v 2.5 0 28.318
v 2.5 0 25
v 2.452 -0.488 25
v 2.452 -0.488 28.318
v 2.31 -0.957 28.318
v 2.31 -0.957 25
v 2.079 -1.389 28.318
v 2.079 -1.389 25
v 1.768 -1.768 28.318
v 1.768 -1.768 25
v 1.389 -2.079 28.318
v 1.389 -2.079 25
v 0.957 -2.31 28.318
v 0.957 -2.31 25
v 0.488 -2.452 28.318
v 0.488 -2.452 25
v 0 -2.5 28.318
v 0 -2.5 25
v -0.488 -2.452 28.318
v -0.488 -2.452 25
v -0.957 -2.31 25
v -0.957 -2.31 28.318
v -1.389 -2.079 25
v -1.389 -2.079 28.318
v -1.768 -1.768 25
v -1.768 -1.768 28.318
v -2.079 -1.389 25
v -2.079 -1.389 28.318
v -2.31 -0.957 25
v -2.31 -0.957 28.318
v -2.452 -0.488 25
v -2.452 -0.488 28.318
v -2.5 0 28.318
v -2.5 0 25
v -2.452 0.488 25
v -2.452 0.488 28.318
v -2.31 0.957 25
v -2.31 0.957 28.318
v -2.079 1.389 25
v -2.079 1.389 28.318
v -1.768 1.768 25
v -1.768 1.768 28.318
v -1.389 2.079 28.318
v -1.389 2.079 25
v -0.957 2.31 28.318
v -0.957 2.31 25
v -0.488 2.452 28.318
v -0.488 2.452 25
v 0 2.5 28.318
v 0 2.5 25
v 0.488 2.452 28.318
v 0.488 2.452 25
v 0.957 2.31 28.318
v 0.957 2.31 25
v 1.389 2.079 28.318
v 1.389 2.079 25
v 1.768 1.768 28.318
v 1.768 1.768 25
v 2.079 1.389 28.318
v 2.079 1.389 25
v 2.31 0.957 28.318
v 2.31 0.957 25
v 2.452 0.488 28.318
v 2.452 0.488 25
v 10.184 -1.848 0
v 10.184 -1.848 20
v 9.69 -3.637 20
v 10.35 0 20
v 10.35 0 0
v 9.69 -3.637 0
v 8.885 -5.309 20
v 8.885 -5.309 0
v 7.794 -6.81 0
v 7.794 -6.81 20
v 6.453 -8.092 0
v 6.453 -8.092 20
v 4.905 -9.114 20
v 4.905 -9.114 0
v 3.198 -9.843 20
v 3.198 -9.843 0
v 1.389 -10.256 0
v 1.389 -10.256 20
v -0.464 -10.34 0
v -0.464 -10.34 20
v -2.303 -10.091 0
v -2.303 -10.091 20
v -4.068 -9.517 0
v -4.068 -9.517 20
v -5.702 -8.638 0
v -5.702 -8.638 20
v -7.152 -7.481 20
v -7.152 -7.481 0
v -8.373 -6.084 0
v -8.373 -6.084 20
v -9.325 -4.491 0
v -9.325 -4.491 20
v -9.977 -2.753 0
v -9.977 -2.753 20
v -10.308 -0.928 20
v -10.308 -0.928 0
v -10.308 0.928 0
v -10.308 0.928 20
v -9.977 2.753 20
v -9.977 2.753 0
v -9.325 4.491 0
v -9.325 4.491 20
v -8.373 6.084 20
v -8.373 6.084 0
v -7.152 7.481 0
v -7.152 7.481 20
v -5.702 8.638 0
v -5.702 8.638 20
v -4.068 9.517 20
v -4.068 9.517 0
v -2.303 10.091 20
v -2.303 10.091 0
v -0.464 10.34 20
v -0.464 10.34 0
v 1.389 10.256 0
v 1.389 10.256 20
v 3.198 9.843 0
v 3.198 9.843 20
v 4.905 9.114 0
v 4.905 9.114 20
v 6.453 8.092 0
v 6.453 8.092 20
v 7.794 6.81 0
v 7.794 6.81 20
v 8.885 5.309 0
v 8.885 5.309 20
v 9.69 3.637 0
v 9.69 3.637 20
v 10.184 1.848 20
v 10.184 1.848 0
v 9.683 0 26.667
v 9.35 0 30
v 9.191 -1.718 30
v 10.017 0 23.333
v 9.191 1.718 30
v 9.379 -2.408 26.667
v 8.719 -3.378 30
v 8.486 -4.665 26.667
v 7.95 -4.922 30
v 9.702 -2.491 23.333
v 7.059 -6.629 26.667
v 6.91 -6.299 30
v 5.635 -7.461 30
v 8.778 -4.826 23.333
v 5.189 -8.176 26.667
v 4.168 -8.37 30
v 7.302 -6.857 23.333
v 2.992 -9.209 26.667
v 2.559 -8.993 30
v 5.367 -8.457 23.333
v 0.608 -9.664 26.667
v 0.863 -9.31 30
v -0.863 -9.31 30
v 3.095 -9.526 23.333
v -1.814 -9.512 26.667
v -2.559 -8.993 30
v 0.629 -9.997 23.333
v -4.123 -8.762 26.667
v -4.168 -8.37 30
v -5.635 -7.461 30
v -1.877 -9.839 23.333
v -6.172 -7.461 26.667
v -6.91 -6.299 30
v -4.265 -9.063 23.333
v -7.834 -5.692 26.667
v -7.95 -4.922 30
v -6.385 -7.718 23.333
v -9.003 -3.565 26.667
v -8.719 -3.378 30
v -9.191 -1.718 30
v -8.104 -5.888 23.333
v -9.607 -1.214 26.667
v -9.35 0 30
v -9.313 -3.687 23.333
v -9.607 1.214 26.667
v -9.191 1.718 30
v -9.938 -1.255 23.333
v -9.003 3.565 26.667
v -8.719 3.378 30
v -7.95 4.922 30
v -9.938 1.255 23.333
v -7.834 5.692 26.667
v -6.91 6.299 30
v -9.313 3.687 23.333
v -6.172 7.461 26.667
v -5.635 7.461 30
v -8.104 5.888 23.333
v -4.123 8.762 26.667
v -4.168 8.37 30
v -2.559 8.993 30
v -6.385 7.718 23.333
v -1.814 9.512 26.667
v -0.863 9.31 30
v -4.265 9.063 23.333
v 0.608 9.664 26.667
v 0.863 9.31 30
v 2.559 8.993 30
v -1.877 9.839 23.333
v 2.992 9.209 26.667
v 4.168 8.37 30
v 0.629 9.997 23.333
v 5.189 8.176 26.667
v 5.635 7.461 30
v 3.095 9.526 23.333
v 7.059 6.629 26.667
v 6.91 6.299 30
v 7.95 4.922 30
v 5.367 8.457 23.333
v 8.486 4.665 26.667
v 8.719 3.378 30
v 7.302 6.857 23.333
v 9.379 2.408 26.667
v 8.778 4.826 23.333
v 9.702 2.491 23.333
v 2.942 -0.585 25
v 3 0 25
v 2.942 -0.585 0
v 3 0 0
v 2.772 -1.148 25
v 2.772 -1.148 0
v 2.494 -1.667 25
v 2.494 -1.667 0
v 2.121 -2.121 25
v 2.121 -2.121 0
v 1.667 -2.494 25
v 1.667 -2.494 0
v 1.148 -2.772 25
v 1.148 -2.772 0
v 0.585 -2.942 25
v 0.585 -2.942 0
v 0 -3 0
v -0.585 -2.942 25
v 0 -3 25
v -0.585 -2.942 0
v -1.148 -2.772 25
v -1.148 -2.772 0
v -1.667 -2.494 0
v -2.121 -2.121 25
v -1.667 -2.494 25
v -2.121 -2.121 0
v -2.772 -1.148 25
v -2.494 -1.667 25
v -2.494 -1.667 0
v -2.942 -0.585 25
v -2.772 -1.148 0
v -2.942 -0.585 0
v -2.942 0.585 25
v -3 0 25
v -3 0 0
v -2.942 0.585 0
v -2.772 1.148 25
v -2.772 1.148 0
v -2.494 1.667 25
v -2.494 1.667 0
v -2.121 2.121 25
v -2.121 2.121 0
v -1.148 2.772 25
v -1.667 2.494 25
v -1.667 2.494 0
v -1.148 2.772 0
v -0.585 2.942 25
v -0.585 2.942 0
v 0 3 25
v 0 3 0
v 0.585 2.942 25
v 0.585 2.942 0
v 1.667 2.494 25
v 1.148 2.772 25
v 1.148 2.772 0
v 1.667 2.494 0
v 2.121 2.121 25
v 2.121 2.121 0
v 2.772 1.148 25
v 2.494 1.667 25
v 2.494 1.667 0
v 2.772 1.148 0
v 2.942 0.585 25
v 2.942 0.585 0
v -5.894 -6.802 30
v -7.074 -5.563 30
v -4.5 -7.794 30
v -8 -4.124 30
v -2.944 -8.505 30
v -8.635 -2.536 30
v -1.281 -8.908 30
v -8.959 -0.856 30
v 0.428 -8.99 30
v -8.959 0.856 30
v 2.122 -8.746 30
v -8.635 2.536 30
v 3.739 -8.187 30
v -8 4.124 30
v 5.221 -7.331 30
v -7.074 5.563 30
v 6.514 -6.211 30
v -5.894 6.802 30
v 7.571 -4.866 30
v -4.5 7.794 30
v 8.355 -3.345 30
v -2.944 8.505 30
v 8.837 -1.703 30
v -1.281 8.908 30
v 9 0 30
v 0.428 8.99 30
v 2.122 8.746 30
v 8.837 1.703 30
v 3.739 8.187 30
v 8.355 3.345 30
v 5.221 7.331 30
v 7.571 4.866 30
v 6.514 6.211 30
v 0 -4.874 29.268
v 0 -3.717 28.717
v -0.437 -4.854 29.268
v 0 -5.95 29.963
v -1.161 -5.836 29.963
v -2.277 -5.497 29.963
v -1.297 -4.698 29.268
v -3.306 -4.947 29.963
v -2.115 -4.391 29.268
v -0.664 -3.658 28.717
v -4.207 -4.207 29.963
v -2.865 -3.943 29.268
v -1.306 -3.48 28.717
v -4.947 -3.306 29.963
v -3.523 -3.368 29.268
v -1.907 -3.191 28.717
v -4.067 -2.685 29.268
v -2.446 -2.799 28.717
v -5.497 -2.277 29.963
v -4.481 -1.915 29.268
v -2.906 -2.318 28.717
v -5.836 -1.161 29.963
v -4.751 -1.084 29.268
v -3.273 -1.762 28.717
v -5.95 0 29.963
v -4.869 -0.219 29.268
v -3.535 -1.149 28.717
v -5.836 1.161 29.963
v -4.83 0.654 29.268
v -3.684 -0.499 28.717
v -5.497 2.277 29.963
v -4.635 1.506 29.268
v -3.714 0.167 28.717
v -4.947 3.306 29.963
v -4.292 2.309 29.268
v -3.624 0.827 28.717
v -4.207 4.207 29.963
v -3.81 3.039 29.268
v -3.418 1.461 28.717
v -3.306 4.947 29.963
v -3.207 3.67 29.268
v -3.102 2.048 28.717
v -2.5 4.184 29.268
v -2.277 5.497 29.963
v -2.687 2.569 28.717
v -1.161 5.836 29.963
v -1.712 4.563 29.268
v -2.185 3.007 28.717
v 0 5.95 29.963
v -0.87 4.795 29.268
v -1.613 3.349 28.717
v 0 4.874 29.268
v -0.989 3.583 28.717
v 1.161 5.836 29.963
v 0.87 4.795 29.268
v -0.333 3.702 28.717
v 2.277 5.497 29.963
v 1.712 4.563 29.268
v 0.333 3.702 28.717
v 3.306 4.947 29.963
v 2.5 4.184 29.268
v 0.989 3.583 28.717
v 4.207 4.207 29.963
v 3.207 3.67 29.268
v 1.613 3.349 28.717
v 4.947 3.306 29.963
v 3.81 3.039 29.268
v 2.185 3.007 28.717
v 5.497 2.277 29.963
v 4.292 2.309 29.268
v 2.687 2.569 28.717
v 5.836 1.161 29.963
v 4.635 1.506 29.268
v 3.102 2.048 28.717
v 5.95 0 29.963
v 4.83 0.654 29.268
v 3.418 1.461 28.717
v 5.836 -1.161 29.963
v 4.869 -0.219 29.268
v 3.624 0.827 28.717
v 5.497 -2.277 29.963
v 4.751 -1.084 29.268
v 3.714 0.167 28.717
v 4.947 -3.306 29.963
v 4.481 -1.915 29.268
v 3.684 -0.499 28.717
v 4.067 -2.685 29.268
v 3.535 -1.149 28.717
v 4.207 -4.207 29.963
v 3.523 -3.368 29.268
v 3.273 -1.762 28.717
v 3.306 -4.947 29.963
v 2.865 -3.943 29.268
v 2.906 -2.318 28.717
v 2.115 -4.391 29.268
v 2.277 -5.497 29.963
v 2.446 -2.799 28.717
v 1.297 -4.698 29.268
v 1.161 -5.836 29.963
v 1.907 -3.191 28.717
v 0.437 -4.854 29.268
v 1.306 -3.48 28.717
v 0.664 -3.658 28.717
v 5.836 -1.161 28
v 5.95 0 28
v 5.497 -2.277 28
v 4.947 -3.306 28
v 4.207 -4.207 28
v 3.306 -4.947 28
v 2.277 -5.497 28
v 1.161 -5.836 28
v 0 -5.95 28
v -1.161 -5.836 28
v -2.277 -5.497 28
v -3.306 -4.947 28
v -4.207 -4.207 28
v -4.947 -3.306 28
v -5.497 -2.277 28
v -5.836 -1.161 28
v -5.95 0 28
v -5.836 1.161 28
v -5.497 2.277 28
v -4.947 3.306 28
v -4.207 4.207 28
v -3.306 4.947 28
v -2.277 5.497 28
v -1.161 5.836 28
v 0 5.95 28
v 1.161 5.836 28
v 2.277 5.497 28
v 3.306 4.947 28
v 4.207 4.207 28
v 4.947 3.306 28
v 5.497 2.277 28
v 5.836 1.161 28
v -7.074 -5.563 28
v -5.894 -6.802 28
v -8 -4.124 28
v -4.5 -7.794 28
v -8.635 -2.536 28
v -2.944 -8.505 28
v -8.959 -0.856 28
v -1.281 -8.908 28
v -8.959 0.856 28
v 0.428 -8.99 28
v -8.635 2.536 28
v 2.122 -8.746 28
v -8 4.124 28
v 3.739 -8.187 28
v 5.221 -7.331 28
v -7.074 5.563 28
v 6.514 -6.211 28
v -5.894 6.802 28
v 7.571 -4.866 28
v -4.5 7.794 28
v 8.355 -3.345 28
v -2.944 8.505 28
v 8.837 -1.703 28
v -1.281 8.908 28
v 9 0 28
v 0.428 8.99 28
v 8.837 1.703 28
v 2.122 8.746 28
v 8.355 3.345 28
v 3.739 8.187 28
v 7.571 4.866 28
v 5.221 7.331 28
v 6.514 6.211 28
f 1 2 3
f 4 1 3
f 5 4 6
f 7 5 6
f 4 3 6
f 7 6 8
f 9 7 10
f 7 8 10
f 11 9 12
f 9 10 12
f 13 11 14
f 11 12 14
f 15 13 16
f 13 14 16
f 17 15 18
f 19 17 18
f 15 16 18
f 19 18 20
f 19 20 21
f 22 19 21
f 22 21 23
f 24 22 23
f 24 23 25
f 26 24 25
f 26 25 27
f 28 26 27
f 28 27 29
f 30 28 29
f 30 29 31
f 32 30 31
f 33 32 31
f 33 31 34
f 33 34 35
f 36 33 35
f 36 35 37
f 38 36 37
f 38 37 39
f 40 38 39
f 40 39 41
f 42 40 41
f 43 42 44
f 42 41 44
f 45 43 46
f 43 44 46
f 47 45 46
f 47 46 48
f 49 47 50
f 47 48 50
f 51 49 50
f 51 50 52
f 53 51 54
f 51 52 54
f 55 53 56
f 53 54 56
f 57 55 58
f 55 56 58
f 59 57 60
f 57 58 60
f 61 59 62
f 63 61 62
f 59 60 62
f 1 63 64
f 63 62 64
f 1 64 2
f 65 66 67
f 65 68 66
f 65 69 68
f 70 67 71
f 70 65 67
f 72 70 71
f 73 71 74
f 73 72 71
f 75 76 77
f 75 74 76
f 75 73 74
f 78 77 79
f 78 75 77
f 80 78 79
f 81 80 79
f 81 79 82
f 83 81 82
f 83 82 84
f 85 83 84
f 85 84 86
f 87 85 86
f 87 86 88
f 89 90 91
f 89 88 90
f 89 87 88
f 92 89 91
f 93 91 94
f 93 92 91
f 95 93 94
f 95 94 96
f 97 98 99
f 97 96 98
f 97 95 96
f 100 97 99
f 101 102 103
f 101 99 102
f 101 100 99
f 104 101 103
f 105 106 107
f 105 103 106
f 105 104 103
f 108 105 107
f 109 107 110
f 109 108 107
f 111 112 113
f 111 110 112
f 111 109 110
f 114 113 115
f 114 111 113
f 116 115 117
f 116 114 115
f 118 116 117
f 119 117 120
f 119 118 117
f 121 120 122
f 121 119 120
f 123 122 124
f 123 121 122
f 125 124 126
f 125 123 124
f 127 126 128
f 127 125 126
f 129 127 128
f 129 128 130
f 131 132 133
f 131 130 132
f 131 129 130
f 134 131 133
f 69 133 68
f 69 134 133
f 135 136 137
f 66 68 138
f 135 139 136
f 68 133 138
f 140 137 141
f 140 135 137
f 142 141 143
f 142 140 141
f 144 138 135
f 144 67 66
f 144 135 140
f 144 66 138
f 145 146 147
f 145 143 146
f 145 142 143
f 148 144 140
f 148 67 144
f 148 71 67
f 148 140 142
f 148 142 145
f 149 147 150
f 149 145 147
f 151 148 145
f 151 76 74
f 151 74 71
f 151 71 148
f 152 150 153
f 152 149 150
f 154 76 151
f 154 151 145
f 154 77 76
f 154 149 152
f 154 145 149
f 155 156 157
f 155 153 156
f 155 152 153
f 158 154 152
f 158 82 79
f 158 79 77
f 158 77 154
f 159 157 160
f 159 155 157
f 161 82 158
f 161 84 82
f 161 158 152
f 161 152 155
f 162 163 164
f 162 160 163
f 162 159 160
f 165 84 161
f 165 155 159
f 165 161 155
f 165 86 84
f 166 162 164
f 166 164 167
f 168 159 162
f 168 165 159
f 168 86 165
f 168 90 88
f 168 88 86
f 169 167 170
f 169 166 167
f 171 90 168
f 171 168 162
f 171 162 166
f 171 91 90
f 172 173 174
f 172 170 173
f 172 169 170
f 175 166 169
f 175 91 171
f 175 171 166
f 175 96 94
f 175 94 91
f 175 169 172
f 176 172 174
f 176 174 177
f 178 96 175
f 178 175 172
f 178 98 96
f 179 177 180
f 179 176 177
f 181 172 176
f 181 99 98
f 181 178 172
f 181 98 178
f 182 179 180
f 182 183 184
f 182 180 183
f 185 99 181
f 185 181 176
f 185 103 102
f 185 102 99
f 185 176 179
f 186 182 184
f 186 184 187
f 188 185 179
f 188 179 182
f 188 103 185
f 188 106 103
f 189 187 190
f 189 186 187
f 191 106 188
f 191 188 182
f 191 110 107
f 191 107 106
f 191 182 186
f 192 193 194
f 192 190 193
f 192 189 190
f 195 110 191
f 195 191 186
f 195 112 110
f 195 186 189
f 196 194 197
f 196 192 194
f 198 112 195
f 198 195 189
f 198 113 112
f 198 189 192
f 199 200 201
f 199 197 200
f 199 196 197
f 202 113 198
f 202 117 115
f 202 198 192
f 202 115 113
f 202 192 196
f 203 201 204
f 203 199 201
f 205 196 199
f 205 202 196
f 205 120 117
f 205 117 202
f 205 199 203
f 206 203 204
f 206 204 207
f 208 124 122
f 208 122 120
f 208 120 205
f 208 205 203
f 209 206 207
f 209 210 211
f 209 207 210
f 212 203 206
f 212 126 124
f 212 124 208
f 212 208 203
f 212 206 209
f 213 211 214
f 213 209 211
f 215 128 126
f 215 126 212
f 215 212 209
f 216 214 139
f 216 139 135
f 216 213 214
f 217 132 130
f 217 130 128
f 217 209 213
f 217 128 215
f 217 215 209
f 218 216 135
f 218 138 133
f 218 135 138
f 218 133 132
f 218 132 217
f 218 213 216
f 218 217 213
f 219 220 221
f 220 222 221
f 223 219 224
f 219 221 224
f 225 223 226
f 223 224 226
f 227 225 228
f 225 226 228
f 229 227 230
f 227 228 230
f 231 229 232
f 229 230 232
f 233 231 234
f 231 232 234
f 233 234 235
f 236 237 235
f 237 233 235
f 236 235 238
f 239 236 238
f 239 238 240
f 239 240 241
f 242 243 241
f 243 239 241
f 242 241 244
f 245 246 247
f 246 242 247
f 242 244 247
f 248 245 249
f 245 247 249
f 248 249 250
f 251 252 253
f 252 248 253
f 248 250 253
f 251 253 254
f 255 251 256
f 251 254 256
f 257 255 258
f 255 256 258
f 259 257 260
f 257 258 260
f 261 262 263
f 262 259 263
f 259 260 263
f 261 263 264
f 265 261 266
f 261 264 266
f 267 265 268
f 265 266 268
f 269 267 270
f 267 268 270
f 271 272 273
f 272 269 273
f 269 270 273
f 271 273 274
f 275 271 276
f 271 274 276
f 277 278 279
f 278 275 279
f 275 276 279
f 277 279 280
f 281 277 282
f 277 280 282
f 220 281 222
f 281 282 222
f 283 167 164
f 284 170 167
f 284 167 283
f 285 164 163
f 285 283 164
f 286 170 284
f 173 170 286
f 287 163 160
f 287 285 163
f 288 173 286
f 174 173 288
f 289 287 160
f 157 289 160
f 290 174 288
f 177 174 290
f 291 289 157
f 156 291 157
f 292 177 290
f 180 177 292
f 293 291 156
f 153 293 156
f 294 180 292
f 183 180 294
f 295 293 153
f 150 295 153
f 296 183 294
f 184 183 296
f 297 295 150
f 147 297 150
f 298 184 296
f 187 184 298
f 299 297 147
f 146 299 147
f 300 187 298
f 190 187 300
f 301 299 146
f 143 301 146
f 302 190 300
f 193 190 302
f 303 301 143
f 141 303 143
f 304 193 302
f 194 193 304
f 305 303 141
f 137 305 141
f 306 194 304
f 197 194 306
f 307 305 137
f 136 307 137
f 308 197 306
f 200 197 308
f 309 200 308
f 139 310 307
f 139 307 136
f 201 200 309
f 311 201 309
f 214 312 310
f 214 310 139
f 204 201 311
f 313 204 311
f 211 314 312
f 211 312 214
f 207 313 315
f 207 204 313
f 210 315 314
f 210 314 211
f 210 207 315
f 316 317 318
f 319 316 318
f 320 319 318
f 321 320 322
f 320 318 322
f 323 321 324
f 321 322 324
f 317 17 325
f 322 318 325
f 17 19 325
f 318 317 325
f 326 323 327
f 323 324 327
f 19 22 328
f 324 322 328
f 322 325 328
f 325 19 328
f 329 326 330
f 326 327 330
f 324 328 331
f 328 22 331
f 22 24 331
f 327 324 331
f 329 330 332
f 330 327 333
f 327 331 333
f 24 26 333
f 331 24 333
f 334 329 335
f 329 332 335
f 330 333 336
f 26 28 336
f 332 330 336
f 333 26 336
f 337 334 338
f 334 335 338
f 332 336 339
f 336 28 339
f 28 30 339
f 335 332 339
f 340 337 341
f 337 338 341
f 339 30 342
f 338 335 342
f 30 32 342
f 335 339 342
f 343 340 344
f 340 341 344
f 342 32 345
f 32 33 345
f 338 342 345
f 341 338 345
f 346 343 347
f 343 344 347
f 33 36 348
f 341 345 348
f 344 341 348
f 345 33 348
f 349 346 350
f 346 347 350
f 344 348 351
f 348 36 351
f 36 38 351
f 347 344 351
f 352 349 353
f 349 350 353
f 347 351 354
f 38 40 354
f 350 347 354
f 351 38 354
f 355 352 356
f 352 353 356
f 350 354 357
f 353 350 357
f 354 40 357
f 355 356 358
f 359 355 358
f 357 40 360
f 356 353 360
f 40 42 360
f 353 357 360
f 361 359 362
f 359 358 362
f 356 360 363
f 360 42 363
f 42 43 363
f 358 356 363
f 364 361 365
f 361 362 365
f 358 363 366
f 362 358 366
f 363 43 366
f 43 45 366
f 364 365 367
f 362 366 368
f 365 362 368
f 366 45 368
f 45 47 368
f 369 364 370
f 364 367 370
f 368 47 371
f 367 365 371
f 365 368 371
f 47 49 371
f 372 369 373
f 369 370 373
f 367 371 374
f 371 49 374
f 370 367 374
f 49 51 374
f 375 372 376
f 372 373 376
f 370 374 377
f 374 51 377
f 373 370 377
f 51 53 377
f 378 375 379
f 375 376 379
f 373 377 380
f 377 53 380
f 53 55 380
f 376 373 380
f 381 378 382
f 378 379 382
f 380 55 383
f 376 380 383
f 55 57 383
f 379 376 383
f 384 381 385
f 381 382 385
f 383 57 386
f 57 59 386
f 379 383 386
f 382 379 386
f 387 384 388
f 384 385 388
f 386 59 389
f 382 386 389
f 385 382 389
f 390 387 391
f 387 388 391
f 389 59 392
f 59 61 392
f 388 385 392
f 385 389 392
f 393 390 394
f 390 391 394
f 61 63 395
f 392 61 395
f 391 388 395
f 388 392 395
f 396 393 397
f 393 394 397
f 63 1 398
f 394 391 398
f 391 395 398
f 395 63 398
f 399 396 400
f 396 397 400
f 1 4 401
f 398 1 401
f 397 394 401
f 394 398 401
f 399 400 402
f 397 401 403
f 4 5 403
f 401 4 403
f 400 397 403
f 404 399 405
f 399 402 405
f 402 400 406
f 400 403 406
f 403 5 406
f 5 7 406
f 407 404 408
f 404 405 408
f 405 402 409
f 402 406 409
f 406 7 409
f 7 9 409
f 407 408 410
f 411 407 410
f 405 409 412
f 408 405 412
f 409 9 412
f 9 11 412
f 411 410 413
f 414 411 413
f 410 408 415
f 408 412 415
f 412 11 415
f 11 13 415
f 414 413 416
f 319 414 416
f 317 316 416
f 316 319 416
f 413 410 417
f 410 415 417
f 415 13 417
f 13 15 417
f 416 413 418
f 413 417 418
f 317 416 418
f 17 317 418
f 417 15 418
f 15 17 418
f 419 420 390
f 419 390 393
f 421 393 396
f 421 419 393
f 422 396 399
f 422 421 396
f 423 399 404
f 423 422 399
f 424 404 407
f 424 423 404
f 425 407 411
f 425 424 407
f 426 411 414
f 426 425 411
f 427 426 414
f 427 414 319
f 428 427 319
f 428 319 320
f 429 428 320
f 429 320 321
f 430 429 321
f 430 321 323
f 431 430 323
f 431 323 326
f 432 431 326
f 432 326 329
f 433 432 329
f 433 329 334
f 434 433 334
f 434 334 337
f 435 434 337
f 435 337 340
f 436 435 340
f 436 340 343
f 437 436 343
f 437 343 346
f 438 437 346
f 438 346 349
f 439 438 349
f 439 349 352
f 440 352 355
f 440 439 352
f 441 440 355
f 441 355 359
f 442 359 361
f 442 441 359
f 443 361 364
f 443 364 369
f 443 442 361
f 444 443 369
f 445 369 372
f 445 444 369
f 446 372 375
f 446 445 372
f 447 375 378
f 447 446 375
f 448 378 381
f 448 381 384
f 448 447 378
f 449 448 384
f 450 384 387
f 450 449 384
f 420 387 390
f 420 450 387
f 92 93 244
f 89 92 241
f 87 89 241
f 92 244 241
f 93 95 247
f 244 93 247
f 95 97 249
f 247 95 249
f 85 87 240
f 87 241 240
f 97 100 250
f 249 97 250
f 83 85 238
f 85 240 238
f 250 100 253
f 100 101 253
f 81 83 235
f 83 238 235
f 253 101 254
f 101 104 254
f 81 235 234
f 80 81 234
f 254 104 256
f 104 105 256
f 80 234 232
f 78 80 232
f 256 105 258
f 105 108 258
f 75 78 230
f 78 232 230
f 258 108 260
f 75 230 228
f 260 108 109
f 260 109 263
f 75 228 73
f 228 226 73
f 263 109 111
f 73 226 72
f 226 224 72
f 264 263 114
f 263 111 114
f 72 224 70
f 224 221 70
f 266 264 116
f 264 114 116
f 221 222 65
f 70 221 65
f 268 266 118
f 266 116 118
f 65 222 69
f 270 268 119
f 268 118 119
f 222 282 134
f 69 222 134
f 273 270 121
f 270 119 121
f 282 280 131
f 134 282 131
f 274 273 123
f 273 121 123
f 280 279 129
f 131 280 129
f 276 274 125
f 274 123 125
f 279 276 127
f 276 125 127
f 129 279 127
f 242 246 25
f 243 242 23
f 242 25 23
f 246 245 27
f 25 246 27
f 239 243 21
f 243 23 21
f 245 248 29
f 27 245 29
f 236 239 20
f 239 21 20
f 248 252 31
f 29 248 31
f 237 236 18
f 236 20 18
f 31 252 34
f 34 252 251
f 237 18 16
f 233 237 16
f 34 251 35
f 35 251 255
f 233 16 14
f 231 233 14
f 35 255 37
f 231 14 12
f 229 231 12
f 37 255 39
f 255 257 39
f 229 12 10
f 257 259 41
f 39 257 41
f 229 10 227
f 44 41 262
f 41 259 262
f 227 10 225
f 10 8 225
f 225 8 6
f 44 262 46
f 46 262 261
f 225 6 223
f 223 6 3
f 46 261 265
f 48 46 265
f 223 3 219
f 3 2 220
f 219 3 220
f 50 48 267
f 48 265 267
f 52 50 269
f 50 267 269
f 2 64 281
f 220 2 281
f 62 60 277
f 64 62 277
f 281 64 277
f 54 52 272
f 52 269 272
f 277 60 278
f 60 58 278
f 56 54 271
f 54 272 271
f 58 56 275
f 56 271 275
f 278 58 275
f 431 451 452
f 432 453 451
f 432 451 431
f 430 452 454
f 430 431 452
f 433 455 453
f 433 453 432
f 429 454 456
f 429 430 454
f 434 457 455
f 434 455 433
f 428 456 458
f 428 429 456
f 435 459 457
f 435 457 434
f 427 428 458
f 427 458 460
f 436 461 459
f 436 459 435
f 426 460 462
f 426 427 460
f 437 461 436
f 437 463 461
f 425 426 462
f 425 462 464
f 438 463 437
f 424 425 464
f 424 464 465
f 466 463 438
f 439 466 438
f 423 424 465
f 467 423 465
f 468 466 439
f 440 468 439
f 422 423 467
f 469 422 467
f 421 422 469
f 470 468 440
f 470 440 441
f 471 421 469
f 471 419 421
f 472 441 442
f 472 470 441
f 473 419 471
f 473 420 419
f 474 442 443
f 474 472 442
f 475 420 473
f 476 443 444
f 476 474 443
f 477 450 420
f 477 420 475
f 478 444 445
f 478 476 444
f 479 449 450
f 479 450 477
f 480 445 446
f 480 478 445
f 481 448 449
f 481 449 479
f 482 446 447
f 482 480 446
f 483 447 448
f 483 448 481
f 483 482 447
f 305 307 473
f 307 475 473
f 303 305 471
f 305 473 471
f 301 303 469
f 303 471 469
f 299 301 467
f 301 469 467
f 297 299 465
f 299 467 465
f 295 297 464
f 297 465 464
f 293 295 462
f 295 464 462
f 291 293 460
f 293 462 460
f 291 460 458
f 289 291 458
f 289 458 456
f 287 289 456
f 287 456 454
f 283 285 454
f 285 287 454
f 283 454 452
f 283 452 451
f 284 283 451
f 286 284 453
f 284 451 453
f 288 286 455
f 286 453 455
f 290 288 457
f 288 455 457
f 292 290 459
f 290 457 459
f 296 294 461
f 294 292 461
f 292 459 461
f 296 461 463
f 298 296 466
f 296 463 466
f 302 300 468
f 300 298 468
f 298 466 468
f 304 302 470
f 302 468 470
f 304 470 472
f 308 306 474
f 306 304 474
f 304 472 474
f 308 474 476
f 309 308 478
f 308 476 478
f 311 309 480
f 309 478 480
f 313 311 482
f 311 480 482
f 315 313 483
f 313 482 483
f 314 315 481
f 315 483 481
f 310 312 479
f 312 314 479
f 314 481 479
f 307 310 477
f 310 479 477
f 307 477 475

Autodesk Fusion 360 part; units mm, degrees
sketch "Sketch1" plane through (0, 0, 0) normal (0, 0, 1) x (1, 0, 0)
  circle A0 centre (0, 0) radius 5.95
  circle A1 centre (0, 0) radius 9
  circle A2 centre (0, 0) radius 10.35
  circle A3 centre (0, 0) radius 2.5
  circle A4 centre (0, 0) radius 3
  dimension "d1" = 11.9
  dimension "d2" = 18
  dimension "d3" = 20.7
  dimension "d8" = 5
  dimension "d9" = 6
extrude "Extrude1" add sketch "Sketch1" along normal blind 30 contours A0 | A2 | A4 makes body 1 at (10.2986, -1.0305, 20) makes body 2 at (5.9204, -0.5924, 20)
extrude "Extrude2" add sketch "Sketch1" along normal blind 28 contours A1 bodies 1 2
extrude "Extrude3" cut sketch "Sketch1" along normal blind 25 contours A3 | A4 bodies 1
chamfer "Chamfer1" distance 1 distance2 10 1 edges at (-9.6496, -3.7427, 30) measured on face at (9.828, -0.9613, 30) on bodies 1
sketch "Sketch2" plane through (0, 0, 0) normal (1, 0, 0) x (0, 0, -1)
  arc A0 (-38, -10) -> (-28, 0) centre (-38, 0) ccw
  line L0 (-28, 0) -> (-38, 0)
  line L1 (-38, 0) -> (-38, -10)
  line L2 (-1.75, 0) -> (-22.5, 0)
  line L3 (-28, 0) -> (-28, -12) construction
  circle A1 centre (-29.55, -7.342) radius 1.55
  dimension "d14" = 10
  dimension "d15" = 38
  dimension "d19" = 3.1
revolve "Revolve1" cut sketch "Sketch2" angle 360 about axis through (0, 0, 28) along (0, 0, 1) contours A0 L0 L1 A1 | A0 A1 picked at (-30.5667, -6.5077) bodies 1
equation "d1 = d2 - ( 2 * 3.05 ) * 1 mm"
equation "d8 = draadstang - 2 * draadstangtolerance"
equation "d9 = draadstang"
equation "draadstang = 6 mm"
equation "draadstangtolerance = 0.5 mm"
